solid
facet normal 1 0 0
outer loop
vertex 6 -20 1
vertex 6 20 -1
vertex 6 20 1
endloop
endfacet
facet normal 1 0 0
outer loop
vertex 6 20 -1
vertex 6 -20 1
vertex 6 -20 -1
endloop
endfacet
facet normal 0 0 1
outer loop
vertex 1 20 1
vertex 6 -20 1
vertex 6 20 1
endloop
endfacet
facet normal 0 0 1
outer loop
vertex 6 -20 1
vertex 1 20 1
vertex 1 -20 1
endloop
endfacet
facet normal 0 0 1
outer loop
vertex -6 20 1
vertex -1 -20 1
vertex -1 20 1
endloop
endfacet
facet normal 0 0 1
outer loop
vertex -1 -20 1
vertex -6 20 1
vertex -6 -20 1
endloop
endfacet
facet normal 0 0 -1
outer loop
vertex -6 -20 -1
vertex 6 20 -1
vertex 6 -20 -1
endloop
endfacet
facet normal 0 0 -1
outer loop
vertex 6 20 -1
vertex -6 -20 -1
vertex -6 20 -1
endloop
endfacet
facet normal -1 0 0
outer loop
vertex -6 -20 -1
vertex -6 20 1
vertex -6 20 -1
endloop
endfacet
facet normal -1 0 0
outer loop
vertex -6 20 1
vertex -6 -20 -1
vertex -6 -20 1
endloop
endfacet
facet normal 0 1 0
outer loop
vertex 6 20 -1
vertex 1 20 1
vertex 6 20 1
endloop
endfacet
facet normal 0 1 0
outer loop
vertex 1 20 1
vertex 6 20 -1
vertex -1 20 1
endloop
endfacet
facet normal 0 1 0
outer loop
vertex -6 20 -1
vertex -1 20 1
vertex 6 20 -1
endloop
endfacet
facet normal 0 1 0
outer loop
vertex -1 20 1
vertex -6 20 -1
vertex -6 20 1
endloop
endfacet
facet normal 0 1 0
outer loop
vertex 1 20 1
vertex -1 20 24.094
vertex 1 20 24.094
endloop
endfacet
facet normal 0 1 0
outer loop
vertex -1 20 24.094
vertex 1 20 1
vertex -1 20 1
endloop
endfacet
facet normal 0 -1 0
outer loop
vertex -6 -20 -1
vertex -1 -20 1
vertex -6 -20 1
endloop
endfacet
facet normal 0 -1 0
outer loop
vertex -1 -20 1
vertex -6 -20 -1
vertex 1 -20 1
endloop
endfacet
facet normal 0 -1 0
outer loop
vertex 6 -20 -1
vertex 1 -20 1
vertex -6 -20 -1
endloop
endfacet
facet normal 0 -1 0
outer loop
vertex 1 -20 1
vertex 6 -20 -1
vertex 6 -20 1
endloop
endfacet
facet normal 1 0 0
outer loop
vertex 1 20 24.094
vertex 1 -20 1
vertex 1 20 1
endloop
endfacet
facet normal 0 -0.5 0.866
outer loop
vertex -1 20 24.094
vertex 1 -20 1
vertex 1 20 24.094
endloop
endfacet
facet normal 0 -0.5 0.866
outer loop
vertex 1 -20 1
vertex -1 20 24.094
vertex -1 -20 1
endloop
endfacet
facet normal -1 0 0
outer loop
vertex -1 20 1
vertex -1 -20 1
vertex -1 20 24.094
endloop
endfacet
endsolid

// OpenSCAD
// Razor holder: angle

thick = 2;       // thickness of material
length = 40;     // length of the whole angle
base = 10+thick; // width of the base
height = length*tan(30); // height of the angle (without base)

angle();

module angle() {
  union() {
    base();
    color("Red") translate([0,0,thick/2])
      wedge();
  }
}

module wedge() {
  rotate([0,-90,0])
    linear_extrude(height=thick,center=true)
    polygon([[0,-length/2],[0,length/2],[height,length/2]]);
}

module base() {
  cube([base,length,thick],center=true);
}
